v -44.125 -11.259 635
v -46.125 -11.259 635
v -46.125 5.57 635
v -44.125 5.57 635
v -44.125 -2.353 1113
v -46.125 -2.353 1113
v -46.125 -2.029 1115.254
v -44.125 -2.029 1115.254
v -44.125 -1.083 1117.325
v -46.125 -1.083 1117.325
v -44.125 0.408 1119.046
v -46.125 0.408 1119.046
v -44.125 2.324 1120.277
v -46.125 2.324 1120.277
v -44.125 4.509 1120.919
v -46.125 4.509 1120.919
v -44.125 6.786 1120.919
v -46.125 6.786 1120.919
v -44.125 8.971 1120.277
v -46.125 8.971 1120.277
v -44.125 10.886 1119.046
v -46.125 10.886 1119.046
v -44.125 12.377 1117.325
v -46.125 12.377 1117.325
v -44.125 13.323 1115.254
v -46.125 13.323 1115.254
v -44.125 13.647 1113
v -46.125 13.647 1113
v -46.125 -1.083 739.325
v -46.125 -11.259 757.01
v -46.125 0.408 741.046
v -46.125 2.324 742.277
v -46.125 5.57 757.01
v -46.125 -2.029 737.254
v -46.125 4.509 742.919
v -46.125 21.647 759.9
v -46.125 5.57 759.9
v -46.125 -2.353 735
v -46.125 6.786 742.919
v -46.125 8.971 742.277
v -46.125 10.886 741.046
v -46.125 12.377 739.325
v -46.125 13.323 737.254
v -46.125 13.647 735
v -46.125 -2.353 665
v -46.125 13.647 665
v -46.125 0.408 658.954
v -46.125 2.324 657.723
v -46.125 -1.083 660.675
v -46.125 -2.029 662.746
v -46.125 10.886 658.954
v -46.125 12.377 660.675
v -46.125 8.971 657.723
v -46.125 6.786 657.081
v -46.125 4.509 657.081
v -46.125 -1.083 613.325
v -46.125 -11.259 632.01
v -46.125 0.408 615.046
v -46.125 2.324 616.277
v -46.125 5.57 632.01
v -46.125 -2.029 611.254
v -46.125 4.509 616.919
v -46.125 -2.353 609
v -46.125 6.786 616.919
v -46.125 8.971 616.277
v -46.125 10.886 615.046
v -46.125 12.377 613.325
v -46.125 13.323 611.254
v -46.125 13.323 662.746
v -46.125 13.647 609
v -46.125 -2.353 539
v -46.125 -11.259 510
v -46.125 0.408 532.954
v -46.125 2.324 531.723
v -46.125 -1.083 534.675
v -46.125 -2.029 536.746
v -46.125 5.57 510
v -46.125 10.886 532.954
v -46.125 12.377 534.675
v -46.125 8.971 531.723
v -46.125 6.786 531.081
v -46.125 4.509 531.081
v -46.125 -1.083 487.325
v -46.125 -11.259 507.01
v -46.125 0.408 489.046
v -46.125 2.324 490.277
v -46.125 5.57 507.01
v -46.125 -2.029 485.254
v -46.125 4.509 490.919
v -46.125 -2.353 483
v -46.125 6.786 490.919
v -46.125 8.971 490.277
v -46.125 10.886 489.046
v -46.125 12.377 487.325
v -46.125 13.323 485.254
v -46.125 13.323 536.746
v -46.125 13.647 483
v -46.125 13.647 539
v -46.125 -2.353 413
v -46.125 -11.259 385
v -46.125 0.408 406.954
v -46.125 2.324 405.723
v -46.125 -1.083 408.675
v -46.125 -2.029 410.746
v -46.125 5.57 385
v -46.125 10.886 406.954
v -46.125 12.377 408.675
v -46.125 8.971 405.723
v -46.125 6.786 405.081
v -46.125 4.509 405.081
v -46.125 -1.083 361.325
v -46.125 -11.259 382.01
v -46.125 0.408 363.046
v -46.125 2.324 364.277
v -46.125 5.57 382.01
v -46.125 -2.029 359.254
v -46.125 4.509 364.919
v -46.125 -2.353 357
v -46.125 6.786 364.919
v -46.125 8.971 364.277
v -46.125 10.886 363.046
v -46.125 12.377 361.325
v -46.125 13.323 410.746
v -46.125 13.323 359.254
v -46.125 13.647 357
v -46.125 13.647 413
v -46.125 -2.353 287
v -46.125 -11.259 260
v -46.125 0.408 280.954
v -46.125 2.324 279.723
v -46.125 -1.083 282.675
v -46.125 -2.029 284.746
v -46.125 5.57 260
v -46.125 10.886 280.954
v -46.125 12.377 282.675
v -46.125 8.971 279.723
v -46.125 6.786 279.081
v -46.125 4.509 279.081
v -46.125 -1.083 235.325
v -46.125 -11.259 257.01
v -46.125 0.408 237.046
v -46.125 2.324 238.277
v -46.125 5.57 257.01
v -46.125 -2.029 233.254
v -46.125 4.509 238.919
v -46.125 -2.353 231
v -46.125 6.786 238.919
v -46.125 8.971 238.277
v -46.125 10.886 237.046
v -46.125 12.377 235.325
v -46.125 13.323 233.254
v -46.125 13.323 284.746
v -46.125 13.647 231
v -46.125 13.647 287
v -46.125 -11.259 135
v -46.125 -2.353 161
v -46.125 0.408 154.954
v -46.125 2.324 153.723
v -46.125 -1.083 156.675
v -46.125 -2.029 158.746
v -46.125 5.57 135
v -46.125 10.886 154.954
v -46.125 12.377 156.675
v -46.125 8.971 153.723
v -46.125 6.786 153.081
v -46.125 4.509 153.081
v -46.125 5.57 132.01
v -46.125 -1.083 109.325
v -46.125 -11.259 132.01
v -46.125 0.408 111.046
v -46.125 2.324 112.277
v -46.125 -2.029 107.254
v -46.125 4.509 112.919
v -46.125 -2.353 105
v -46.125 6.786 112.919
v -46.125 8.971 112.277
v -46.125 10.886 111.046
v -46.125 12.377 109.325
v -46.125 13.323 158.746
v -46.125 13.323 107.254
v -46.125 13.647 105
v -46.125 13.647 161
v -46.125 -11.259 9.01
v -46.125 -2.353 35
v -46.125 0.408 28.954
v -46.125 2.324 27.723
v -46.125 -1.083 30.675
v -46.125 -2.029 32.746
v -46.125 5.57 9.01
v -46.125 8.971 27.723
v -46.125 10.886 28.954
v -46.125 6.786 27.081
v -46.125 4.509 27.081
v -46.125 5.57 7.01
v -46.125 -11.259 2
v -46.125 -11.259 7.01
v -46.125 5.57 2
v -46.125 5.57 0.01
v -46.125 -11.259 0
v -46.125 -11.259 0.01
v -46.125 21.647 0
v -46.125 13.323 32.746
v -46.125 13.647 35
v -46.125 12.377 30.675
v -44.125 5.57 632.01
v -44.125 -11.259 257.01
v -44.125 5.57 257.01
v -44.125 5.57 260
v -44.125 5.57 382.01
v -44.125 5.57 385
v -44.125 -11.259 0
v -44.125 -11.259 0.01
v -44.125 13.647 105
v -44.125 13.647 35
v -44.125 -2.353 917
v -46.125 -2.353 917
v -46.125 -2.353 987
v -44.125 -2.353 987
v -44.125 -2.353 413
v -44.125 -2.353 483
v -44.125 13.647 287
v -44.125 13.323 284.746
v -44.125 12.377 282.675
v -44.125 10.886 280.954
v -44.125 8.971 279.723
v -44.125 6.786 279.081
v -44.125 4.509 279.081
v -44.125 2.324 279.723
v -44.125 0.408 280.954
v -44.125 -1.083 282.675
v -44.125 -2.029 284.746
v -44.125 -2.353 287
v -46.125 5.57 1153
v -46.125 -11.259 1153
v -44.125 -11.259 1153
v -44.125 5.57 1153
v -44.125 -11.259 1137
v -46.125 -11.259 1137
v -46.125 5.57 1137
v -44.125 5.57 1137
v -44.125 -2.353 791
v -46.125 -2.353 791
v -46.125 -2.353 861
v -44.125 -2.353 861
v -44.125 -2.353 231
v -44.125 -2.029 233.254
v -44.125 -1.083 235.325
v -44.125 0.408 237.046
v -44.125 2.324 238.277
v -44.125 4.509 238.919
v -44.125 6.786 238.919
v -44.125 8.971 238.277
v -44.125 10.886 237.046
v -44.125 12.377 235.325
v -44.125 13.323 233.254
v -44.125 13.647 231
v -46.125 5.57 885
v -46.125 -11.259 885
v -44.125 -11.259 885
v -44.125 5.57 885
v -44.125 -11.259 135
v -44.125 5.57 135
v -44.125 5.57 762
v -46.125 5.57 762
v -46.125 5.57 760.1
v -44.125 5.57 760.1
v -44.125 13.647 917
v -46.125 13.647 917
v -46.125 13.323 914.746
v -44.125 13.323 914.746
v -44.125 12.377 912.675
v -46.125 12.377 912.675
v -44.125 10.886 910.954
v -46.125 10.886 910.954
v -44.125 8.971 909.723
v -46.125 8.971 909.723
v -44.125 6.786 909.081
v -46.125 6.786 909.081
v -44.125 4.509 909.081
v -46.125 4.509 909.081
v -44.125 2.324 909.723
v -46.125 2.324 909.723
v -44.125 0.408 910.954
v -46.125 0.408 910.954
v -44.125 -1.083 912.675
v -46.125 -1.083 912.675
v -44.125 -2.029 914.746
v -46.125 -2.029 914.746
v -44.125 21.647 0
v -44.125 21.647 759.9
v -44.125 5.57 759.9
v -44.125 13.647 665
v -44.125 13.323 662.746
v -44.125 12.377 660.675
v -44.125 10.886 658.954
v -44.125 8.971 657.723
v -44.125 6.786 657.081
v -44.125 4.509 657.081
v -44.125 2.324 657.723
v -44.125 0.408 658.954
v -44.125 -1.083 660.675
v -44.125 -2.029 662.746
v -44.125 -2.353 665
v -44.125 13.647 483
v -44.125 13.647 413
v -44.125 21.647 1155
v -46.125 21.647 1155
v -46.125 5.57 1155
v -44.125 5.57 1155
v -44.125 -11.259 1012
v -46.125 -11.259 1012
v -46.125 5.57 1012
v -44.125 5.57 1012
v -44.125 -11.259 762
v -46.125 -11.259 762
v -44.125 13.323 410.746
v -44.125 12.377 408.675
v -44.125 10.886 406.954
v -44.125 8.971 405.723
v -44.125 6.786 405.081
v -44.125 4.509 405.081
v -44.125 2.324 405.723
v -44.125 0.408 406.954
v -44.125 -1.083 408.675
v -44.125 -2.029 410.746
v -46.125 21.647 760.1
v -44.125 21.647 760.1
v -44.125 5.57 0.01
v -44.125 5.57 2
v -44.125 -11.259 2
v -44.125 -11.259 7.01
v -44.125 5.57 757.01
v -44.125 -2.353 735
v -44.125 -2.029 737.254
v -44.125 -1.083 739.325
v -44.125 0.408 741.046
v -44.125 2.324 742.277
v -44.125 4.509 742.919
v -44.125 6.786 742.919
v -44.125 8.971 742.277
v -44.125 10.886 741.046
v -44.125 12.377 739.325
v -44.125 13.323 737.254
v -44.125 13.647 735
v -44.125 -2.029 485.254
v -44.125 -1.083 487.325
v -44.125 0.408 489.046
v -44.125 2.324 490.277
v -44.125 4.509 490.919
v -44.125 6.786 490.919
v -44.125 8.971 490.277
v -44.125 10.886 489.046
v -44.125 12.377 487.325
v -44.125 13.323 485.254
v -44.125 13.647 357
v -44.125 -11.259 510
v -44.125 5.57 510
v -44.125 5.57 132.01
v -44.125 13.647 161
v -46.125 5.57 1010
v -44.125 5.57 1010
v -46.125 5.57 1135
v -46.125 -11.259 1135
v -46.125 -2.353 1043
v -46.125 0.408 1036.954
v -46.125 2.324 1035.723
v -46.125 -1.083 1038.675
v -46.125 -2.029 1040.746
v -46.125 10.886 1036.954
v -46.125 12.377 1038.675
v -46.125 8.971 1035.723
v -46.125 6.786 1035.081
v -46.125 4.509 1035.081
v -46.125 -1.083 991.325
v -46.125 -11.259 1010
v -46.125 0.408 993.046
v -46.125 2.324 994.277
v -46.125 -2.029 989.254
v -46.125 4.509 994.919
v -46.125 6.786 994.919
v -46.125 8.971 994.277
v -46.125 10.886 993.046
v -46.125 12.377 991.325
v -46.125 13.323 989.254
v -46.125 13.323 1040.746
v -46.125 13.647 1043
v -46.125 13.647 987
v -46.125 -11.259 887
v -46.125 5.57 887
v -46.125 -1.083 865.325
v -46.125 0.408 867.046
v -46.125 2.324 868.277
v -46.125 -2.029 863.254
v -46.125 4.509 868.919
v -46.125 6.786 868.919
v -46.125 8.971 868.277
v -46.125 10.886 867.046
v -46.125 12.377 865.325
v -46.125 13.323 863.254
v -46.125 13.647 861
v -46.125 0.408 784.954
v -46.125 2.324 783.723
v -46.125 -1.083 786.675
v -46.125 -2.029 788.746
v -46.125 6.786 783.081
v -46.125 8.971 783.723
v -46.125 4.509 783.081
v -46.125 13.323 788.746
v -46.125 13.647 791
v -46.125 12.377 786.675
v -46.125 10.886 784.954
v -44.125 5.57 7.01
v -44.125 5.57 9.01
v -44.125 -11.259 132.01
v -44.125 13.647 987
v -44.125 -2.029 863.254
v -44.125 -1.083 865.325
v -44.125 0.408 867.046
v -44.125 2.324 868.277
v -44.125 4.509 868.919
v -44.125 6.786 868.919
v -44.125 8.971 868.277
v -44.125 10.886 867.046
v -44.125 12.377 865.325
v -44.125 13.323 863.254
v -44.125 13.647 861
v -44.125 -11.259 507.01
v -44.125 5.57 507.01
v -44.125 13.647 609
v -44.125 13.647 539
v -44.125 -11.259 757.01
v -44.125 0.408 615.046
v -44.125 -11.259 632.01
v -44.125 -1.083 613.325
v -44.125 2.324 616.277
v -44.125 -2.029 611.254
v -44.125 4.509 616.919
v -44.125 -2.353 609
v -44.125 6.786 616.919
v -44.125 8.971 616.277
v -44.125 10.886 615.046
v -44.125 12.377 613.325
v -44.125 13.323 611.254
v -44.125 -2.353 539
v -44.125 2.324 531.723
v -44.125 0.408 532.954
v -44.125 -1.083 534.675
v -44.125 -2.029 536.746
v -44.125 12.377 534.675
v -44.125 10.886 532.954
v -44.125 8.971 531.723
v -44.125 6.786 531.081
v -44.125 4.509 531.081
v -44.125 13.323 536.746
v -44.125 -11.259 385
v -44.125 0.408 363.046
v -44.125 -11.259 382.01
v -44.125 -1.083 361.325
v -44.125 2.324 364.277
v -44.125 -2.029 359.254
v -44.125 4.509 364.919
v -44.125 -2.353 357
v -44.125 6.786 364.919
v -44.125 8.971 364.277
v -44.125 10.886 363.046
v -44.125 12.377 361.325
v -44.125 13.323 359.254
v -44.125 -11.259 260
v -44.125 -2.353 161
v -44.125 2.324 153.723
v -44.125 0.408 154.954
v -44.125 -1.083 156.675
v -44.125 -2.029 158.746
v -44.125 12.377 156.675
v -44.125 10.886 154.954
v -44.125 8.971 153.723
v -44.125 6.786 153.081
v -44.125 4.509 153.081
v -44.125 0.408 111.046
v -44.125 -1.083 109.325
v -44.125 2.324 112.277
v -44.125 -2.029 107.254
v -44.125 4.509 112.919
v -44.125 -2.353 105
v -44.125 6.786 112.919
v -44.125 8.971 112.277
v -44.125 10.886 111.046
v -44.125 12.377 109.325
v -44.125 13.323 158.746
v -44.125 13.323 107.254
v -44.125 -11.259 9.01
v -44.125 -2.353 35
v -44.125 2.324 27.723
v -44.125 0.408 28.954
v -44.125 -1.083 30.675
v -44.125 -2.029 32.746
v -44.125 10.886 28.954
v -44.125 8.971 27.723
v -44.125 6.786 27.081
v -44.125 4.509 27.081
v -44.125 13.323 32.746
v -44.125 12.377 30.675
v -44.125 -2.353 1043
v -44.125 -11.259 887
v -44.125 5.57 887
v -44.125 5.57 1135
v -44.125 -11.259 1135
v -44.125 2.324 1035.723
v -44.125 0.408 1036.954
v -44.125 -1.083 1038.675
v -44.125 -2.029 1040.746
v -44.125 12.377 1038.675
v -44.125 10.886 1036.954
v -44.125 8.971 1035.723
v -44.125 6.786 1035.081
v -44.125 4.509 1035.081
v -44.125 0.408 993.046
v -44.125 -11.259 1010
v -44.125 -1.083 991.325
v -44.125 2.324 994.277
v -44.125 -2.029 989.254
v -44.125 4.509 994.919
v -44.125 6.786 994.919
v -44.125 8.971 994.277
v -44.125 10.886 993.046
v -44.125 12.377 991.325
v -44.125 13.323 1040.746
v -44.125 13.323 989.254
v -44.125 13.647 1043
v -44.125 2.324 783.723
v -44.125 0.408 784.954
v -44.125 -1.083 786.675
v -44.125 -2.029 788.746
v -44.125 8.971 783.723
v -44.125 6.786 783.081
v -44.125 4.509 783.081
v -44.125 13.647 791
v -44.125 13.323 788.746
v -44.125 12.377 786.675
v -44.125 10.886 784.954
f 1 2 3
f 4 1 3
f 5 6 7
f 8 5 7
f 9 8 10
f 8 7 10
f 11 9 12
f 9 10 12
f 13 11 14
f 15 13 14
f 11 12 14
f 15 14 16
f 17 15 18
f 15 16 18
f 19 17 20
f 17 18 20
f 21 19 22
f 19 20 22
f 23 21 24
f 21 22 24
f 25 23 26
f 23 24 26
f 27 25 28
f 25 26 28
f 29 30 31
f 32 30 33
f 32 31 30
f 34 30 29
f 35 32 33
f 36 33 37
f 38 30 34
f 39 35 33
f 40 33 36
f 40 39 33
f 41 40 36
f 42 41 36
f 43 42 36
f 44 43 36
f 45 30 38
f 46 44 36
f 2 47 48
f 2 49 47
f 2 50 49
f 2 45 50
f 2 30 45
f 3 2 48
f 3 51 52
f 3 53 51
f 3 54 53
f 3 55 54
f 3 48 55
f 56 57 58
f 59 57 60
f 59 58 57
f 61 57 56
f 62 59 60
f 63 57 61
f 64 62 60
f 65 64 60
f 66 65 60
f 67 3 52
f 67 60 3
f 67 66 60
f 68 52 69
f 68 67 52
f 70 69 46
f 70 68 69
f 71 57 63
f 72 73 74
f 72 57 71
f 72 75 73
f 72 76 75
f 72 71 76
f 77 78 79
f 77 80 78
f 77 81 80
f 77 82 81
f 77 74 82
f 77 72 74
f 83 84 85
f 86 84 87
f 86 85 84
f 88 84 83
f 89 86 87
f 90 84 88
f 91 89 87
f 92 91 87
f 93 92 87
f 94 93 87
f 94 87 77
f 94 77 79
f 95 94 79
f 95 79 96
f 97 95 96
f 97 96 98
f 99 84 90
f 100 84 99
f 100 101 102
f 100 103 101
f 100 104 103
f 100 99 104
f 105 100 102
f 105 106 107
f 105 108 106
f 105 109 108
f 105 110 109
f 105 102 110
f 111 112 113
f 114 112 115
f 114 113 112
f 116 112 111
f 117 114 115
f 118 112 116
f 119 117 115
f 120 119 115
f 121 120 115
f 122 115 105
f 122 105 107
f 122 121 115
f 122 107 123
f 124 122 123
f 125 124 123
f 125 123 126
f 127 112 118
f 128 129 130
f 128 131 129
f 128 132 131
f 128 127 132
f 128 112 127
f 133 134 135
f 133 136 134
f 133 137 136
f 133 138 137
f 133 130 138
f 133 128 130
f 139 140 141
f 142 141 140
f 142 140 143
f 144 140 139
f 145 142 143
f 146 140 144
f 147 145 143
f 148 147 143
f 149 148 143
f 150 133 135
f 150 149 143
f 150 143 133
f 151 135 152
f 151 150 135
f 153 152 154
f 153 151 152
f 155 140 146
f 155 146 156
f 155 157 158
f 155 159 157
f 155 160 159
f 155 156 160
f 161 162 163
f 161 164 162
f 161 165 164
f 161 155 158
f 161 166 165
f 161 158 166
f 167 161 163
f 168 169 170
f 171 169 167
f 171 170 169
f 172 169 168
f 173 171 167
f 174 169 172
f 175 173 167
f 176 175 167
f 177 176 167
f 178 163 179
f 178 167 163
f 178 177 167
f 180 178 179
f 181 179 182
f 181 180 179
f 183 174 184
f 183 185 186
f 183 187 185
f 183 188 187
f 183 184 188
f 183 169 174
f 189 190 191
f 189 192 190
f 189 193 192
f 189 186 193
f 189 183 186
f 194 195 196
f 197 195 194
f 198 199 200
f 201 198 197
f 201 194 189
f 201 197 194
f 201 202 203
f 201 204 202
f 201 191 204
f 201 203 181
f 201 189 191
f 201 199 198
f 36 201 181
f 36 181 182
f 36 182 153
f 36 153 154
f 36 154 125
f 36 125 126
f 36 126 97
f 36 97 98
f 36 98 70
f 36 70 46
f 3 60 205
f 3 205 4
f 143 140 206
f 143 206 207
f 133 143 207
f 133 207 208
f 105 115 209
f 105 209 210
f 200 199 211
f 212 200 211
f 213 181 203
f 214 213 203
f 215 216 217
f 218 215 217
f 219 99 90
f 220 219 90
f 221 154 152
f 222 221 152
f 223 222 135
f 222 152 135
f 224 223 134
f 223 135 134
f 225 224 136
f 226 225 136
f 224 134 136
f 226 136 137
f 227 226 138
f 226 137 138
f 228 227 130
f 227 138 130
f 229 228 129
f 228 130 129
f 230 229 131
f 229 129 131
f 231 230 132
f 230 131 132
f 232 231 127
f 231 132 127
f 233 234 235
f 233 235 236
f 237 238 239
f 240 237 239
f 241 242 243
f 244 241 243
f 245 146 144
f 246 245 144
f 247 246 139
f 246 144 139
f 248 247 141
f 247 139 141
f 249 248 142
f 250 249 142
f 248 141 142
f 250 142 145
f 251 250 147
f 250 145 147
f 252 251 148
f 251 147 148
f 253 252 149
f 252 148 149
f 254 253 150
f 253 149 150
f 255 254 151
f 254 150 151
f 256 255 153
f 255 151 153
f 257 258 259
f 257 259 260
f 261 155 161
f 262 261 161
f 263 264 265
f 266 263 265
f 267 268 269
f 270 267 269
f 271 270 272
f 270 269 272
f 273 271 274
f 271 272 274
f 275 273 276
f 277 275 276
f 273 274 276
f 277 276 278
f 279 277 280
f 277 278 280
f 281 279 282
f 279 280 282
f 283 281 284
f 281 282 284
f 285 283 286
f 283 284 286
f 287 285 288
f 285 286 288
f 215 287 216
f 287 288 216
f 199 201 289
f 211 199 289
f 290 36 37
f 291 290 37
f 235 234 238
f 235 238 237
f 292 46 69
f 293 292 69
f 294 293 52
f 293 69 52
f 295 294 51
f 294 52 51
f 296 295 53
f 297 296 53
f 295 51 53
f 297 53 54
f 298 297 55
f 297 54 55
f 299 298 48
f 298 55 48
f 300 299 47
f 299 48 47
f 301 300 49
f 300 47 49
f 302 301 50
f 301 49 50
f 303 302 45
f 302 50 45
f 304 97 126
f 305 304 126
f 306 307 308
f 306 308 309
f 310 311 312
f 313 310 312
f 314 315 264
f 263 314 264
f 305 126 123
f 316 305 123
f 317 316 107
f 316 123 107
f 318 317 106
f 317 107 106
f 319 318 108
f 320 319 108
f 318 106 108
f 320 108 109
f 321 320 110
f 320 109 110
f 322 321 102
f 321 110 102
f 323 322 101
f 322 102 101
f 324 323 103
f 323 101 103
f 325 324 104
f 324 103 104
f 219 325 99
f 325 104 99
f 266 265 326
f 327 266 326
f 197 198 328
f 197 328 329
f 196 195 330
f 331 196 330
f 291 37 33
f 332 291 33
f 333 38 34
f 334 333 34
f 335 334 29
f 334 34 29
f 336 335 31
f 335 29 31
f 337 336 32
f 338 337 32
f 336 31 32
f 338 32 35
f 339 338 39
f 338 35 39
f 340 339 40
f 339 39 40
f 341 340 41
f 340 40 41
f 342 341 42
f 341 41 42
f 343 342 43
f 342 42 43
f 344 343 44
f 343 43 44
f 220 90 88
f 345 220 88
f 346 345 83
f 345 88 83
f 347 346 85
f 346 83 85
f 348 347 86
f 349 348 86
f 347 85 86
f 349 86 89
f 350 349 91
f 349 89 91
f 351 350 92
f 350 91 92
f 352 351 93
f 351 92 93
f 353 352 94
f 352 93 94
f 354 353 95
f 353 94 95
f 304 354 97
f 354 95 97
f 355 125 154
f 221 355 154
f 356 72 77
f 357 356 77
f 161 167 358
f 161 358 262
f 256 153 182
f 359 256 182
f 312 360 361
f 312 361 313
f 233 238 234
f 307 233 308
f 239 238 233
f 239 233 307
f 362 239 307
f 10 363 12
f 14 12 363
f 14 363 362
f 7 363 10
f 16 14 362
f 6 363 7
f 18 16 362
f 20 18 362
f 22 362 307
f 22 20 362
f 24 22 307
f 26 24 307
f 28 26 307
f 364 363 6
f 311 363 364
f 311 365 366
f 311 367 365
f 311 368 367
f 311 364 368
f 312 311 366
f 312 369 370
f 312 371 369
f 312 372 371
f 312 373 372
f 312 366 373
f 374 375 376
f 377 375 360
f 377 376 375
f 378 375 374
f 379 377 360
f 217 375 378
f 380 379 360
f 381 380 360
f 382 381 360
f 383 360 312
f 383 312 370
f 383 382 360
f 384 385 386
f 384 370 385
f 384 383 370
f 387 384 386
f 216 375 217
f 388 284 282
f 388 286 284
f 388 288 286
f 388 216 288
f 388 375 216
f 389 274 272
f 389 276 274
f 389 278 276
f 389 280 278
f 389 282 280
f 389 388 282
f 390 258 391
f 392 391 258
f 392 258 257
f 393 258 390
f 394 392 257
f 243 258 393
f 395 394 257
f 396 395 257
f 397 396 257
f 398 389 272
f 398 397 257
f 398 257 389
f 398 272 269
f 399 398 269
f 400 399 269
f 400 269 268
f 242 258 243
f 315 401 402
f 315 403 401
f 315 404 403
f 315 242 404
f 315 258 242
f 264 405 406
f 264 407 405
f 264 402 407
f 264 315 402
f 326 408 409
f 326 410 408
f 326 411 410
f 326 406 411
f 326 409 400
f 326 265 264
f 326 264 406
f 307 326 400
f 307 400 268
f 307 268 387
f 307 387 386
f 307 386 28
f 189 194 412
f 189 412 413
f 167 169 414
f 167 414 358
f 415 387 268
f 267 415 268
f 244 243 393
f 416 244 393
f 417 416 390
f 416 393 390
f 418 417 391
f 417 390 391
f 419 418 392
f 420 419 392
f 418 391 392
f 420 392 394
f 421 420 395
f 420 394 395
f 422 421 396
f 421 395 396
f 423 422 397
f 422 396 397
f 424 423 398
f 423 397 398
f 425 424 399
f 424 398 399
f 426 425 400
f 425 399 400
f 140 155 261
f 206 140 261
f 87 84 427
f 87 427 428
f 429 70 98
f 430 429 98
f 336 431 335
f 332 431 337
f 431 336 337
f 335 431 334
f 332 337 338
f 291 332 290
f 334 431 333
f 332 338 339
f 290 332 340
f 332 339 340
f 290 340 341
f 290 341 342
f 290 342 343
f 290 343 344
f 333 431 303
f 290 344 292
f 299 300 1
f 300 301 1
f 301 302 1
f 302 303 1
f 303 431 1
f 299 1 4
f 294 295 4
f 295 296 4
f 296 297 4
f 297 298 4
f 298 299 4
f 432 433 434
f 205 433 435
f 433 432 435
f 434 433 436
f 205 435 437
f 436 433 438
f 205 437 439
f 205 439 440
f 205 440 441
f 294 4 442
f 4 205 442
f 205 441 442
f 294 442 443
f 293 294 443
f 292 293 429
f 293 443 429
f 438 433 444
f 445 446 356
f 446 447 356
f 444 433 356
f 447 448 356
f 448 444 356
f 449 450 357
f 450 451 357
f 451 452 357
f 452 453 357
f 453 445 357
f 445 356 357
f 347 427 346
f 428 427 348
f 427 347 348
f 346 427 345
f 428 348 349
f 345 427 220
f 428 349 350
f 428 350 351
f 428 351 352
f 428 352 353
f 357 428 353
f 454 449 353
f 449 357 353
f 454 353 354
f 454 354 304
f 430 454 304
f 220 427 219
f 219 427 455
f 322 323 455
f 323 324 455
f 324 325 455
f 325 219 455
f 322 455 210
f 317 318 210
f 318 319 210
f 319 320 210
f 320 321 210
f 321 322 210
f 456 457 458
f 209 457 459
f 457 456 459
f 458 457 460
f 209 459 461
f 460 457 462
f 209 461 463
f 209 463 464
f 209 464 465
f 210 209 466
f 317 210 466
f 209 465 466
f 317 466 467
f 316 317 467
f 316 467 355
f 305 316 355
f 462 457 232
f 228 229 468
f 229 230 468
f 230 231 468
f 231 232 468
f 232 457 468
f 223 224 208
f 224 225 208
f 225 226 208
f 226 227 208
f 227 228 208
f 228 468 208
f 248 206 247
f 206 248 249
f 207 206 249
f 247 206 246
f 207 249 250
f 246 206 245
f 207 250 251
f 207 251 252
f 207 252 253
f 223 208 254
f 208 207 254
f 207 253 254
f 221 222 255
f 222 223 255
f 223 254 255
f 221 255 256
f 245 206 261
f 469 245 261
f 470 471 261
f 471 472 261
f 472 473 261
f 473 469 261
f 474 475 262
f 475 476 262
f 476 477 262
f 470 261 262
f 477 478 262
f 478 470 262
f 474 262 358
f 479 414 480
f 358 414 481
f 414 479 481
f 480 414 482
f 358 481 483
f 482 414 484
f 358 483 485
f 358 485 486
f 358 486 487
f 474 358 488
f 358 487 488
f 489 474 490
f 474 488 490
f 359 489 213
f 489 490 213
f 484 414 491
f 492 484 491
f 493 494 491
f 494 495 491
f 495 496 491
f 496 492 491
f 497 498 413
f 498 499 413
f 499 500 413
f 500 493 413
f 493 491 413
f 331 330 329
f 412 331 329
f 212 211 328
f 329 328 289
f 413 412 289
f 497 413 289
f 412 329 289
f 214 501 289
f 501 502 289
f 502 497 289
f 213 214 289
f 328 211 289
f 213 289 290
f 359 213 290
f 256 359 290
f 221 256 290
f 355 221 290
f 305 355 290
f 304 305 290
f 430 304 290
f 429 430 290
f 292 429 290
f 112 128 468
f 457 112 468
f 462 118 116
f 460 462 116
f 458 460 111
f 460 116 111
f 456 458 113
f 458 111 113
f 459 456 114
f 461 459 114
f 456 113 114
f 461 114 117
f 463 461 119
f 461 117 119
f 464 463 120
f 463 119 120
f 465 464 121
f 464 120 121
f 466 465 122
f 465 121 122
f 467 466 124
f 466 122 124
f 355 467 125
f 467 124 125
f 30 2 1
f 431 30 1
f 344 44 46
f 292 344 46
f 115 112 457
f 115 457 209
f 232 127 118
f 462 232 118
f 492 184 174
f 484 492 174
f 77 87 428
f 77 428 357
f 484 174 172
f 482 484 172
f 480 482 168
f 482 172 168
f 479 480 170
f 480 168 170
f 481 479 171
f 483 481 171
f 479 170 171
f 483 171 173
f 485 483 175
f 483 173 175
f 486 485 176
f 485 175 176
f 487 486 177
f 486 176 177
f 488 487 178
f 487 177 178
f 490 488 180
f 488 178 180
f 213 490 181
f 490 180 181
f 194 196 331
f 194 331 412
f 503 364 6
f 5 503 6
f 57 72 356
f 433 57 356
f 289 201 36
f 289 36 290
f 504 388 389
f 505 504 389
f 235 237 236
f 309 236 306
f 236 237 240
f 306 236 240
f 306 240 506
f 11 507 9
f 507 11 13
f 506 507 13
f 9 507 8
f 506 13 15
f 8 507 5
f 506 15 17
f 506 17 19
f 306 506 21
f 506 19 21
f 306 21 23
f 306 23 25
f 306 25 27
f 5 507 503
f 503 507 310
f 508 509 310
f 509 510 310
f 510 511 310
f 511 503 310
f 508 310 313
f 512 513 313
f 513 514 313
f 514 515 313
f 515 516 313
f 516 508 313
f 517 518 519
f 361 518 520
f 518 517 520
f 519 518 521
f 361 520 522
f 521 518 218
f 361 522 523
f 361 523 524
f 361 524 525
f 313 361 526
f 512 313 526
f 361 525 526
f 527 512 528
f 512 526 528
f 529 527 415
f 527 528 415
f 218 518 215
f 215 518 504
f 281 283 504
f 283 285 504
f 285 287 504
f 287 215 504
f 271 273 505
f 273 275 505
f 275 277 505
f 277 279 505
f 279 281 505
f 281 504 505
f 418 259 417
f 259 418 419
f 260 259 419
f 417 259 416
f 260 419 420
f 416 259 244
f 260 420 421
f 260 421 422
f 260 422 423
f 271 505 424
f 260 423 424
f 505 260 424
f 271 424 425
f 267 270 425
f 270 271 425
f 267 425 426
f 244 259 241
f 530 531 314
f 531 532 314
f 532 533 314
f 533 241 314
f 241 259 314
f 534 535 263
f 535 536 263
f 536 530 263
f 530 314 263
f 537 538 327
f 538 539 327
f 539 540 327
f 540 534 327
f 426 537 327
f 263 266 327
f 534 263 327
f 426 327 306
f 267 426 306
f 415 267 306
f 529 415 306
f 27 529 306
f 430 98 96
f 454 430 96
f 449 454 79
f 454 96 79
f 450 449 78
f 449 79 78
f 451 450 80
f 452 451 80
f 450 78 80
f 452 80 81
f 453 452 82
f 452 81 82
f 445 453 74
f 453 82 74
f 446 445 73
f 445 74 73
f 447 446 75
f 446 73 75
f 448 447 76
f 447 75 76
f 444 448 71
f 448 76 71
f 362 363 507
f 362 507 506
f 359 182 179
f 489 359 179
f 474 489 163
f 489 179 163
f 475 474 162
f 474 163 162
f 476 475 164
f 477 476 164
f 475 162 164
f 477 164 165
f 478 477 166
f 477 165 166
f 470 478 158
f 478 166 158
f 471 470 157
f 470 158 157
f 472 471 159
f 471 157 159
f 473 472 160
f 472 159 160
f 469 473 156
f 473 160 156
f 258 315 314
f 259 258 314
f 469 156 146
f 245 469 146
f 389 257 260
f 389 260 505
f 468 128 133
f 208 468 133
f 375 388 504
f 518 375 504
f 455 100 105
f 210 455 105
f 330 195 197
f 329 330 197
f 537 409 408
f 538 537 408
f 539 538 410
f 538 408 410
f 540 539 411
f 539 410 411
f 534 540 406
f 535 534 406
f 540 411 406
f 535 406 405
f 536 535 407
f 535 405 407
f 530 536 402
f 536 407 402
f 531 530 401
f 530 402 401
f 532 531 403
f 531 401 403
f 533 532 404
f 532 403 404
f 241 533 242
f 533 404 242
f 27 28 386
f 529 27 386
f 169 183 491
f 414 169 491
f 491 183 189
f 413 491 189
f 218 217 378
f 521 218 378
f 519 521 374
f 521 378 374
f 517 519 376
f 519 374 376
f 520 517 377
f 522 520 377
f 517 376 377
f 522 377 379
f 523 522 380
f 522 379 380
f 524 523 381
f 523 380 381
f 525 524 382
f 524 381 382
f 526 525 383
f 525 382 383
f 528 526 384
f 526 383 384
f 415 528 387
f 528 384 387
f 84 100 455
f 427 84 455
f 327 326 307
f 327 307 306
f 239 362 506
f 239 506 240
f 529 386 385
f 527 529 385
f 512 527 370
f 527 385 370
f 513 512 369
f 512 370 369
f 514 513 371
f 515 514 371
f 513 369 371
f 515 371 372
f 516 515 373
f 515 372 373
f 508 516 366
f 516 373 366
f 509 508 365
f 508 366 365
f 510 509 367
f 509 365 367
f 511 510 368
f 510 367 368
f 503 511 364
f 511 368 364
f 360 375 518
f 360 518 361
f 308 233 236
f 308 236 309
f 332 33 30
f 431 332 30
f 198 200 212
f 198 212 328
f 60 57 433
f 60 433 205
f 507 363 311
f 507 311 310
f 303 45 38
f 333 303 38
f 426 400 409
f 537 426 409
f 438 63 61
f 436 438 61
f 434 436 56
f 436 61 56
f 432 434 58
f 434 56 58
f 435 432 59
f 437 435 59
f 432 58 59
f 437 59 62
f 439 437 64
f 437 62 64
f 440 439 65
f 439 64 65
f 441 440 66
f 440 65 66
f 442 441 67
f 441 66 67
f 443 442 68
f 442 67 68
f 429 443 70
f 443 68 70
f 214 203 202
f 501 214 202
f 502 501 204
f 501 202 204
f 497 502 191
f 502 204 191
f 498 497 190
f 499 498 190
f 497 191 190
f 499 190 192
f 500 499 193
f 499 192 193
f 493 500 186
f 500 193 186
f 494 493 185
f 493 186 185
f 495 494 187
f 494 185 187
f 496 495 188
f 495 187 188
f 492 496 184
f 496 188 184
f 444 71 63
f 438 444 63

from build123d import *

# Parameters (mm, degrees)
SKETCH_1_W          = 2
SKETCH_1_H          = 32.905807398
EXTRUDE_1_DEPTH     = 1155
SKETCH_2_W          = 1.99
SKETCH_2_H          = 16.828171787
SKETCH_2_W_2        = 2
SKETCH_2_W_3        = 2.99
CUT_EXTRUDE_1_DEPTH = 3


with BuildPart() as part:
    # 草图1 → 凸台-拉伸1 (new body)
    with BuildSketch(Plane.XY):
        with Locations((-45.125456821, 5.194351007)):
            Rectangle(SKETCH_1_W, SKETCH_1_H)
    extrude(amount=EXTRUDE_1_DEPTH)

    # 草图2 → 切除-拉伸1 (cut)
    with BuildSketch(Plane.ZY.offset(46.125456821)):
        with Locations((1.005, -2.844466799)):
            Rectangle(SKETCH_2_W, SKETCH_2_H)
        with Locations((8.01, -2.844466799)):
            Rectangle(SKETCH_2_W_2, SKETCH_2_H)
        with BuildLine():
            Line((35, -2.352745294), (105, -2.352745294))
            ThreePointArc((105, -2.352745294), (113, 5.647254706), (105, 13.647254706))
            Line((105, 13.647254706), (35, 13.647254706))
            ThreePointArc((35, 13.647254706), (27, 5.647254706), (35, -2.352745294))
        make_face()
        with Locations((133.505, -2.844466799)):
            Rectangle(SKETCH_2_W_3, SKETCH_2_H)
        with BuildLine():
            Line((161, -2.352745294), (231, -2.352745294))
            ThreePointArc((231, -2.352745294), (239, 5.647254706), (231, 13.647254706))
            Line((231, 13.647254706), (161, 13.647254706))
            ThreePointArc((161, 13.647254706), (153, 5.647254706), (161, -2.352745294))
        make_face()
        with Locations((258.505, -2.844466799)):
            Rectangle(SKETCH_2_W_3, SKETCH_2_H)
        with BuildLine():
            Line((287, -2.352745294), (357, -2.352745294))
            ThreePointArc((357, -2.352745294), (365, 5.647254706), (357, 13.647254706))
            Line((357, 13.647254706), (287, 13.647254706))
            ThreePointArc((287, 13.647254706), (279, 5.647254706), (287, -2.352745294))
        make_face()
        with Locations((383.505, -2.844466799)):
            Rectangle(SKETCH_2_W_3, SKETCH_2_H)
        with BuildLine():
            Line((413, -2.352745294), (483, -2.352745294))
            ThreePointArc((483, -2.352745294), (491, 5.647254706), (483, 13.647254706))
            Line((483, 13.647254706), (413, 13.647254706))
            ThreePointArc((413, 13.647254706), (405, 5.647254706), (413, -2.352745294))
        make_face()
        with Locations((508.505, -2.844466799)):
            Rectangle(SKETCH_2_W_3, SKETCH_2_H)
        with BuildLine():
            Line((539, -2.352745294), (609, -2.352745294))
            ThreePointArc((609, -2.352745294), (617, 5.647254706), (609, 13.647254706))
            Line((609, 13.647254706), (539, 13.647254706))
            ThreePointArc((539, 13.647254706), (531, 5.647254706), (539, -2.352745294))
        make_face()
        with Locations((633.505, -2.844466799)):
            Rectangle(SKETCH_2_W_3, SKETCH_2_H)
        with BuildLine():
            Line((665, -2.352745294), (735, -2.352745294))
            ThreePointArc((735, -2.352745294), (743, 5.647254706), (735, 13.647254706))
            Line((735, 13.647254706), (665, 13.647254706))
            ThreePointArc((665, 13.647254706), (657, 5.647254706), (665, -2.352745294))
        make_face()
        Polygon((757.01, 5.569619095), (757.01, -11.258552692), (760, -11.258552692), (760, 5.569619095), (759.9, 5.569619095), align=None)
        Polygon((760, 5.569619095), (760, -11.258552692), (762, -11.258552692), (762, 5.569619095), (760.1, 5.569619095), align=None)
        Polygon((759.9, 21.647254706), (759.9, 5.569619095), (760, 5.569619095), (760.1, 5.569619095), (760.1, 21.647254706), align=None)
        with BuildLine():
            Line((791, -2.352745294), (861, -2.352745294))
            ThreePointArc((861, -2.352745294), (869, 5.647254706), (861, 13.647254706))
            Line((861, 13.647254706), (791, 13.647254706))
            ThreePointArc((791, 13.647254706), (783, 5.647254706), (791, -2.352745294))
        make_face()
        with Locations((886, -2.844466799)):
            Rectangle(SKETCH_2_W_2, SKETCH_2_H)
        with BuildLine():
            Line((917, -2.352745294), (987, -2.352745294))
            ThreePointArc((987, -2.352745294), (995, 5.647254706), (987, 13.647254706))
            Line((987, 13.647254706), (917, 13.647254706))
            ThreePointArc((917, 13.647254706), (909, 5.647254706), (917, -2.352745294))
        make_face()
        with Locations((1011, -2.844466799)):
            Rectangle(SKETCH_2_W_2, SKETCH_2_H)
        with BuildLine():
            Line((1043, -2.352745294), (1113, -2.352745294))
            ThreePointArc((1113, -2.352745294), (1121, 5.647254706), (1113, 13.647254706))
            Line((1113, 13.647254706), (1043, 13.647254706))
            ThreePointArc((1043, 13.647254706), (1035, 5.647254706), (1043, -2.352745294))
        make_face()
        with Locations((1136, -2.844466799)):
            Rectangle(SKETCH_2_W_2, SKETCH_2_H)
        with Locations((1154, -2.844466799)):
            Rectangle(SKETCH_2_W_2, SKETCH_2_H)
    extrude(amount=-CUT_EXTRUDE_1_DEPTH, mode=Mode.SUBTRACT)


with BuildPart() as cut_extrude_1_piece_1:
    # of the separate pieces the step leaves, piece 1, a body of its own (cut_extrude_1_pieces)
    add(part.part.solids().sort_by_distance((-44.125456821, 21.647254706, 0))[0])


with BuildPart() as cut_extrude_1_piece_2:
    # of the separate pieces the step leaves, piece 2, a body of its own (cut_extrude_1_pieces)
    add(part.part.solids().sort_by_distance((-46.125456821, 21.647254706, 760.1))[0])


solid = Compound([cut_extrude_1_piece_1.part, cut_extrude_1_piece_2.part])
